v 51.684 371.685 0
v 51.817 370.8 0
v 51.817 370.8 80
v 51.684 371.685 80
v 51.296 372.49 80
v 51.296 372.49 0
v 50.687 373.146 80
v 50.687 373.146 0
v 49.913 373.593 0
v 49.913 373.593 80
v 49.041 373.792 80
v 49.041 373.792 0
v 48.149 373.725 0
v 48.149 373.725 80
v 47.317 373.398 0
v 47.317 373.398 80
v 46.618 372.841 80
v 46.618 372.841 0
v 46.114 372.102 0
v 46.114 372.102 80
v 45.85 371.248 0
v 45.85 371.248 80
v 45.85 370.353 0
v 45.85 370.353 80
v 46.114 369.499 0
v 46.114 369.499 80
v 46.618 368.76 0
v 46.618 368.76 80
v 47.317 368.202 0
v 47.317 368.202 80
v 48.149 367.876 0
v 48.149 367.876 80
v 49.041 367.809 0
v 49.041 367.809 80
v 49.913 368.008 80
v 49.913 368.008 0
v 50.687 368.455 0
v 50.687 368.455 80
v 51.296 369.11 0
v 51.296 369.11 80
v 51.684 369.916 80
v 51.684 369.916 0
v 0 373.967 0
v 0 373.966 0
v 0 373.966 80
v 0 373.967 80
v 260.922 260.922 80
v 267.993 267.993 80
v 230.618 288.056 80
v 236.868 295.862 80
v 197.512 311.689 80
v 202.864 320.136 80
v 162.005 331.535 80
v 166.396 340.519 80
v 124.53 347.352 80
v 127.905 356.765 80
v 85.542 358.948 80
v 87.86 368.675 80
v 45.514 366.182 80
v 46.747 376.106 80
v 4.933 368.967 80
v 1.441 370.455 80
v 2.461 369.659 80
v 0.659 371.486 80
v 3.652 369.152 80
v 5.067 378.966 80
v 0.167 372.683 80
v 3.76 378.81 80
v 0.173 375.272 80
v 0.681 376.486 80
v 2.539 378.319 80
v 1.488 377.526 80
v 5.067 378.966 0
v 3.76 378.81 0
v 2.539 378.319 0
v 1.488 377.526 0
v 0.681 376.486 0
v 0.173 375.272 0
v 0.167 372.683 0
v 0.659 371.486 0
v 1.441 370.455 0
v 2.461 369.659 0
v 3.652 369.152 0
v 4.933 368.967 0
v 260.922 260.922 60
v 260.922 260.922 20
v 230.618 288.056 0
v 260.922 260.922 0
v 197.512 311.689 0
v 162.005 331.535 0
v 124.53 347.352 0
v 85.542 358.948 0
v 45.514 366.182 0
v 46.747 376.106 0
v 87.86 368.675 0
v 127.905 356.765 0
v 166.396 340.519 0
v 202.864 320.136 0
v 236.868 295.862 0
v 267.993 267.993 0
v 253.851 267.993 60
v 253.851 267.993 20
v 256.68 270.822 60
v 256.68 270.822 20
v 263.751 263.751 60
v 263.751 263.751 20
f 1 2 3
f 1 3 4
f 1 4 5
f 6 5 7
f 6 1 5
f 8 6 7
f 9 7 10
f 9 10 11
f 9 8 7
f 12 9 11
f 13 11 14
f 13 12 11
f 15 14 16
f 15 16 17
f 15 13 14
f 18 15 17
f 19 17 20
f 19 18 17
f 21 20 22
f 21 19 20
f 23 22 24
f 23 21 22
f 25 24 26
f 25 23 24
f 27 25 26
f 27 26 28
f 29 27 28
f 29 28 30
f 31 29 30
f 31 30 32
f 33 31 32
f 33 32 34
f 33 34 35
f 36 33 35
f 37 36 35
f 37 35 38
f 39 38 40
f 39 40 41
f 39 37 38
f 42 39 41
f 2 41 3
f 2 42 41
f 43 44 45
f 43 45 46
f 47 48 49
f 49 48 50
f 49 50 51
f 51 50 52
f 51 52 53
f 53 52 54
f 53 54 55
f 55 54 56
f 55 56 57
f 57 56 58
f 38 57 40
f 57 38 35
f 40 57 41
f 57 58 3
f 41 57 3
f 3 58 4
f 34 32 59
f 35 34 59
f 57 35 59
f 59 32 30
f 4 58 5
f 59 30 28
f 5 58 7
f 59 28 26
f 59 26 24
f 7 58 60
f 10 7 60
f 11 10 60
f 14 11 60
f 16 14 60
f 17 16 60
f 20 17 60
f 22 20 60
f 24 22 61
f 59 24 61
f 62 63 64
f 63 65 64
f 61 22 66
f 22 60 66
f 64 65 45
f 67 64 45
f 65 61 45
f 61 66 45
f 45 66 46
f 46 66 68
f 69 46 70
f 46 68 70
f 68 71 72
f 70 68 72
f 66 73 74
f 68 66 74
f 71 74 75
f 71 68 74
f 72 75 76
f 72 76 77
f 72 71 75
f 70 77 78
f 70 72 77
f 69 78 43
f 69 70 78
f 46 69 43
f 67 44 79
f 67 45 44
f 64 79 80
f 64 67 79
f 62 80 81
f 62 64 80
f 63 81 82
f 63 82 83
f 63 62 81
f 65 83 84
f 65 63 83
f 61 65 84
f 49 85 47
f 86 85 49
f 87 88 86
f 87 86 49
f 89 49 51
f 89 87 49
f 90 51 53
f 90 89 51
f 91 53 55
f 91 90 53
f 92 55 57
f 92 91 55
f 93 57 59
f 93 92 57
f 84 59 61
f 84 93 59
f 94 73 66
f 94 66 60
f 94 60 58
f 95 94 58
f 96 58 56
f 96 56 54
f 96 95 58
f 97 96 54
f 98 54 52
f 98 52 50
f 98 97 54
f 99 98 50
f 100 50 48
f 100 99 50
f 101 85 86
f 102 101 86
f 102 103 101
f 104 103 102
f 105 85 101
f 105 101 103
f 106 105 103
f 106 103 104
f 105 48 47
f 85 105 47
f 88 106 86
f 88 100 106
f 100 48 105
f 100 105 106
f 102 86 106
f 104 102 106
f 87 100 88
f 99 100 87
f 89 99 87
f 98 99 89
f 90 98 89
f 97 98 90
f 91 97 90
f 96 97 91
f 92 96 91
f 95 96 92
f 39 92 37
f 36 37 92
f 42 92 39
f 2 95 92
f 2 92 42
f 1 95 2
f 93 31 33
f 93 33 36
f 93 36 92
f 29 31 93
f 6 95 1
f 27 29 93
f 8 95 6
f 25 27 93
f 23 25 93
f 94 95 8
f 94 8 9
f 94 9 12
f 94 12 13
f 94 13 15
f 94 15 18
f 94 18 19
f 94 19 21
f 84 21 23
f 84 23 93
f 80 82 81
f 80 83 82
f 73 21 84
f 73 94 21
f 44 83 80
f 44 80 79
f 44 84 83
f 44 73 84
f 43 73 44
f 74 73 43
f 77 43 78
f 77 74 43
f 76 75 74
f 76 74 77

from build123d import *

# Parameters (mm, degrees)
ESQUISSE1_R             = 3
BOSS_EXTRU_1_DEPTH      = 80
CONG_2_R                = 5
ESQUISSE2_W             = 40
ESQUISSE2_H             = 4
ENL_V_MAT_EXTRU_1_DEPTH = 10


with BuildPart() as part:
    # Esquisse1 → Boss.-Extru.1 (new body)
    with BuildSketch(Plane.XY):
        with BuildLine():
            ThreePointArc((0, 379), (145.037020866, 350.150342822), (267.99347007, 267.99347007))
            Line((267.99347007, 267.99347007), (260.922402258, 260.922402258))
            ThreePointArc((260.922402258, 260.922402258), (141.210186543, 340.911547497), (0, 369))
            Line((0, 369), (0, 379))
        make_face()
        with Locations((48.81679589, 370.800378154)):
            Circle(ESQUISSE1_R, mode=Mode.SUBTRACT)
    extrude(amount=BOSS_EXTRU_1_DEPTH)

    # Congé2
    cong_2_edges = [part.edges().sort_by_distance(p)[0] for p in [
        (0, 369, 40),
        (0, 379, 40),
    ]]
    fillet(cong_2_edges, radius=CONG_2_R - 0.0001)  # a hair under: the kernel refuses the full size

    # Esquisse2 → Enlèv. mat.-Extru.1 (cut)
    with BuildSketch(Plane(origin=(0, 0, 0), x_dir=(0, 0, -1), z_dir=(0.7071067811865448, -0.7071067811865503, 0))):
        with Locations((-40, 371)):
            Rectangle(ESQUISSE2_W, ESQUISSE2_H)
    extrude(amount=-ENL_V_MAT_EXTRU_1_DEPTH, mode=Mode.SUBTRACT)


solid = part.part
